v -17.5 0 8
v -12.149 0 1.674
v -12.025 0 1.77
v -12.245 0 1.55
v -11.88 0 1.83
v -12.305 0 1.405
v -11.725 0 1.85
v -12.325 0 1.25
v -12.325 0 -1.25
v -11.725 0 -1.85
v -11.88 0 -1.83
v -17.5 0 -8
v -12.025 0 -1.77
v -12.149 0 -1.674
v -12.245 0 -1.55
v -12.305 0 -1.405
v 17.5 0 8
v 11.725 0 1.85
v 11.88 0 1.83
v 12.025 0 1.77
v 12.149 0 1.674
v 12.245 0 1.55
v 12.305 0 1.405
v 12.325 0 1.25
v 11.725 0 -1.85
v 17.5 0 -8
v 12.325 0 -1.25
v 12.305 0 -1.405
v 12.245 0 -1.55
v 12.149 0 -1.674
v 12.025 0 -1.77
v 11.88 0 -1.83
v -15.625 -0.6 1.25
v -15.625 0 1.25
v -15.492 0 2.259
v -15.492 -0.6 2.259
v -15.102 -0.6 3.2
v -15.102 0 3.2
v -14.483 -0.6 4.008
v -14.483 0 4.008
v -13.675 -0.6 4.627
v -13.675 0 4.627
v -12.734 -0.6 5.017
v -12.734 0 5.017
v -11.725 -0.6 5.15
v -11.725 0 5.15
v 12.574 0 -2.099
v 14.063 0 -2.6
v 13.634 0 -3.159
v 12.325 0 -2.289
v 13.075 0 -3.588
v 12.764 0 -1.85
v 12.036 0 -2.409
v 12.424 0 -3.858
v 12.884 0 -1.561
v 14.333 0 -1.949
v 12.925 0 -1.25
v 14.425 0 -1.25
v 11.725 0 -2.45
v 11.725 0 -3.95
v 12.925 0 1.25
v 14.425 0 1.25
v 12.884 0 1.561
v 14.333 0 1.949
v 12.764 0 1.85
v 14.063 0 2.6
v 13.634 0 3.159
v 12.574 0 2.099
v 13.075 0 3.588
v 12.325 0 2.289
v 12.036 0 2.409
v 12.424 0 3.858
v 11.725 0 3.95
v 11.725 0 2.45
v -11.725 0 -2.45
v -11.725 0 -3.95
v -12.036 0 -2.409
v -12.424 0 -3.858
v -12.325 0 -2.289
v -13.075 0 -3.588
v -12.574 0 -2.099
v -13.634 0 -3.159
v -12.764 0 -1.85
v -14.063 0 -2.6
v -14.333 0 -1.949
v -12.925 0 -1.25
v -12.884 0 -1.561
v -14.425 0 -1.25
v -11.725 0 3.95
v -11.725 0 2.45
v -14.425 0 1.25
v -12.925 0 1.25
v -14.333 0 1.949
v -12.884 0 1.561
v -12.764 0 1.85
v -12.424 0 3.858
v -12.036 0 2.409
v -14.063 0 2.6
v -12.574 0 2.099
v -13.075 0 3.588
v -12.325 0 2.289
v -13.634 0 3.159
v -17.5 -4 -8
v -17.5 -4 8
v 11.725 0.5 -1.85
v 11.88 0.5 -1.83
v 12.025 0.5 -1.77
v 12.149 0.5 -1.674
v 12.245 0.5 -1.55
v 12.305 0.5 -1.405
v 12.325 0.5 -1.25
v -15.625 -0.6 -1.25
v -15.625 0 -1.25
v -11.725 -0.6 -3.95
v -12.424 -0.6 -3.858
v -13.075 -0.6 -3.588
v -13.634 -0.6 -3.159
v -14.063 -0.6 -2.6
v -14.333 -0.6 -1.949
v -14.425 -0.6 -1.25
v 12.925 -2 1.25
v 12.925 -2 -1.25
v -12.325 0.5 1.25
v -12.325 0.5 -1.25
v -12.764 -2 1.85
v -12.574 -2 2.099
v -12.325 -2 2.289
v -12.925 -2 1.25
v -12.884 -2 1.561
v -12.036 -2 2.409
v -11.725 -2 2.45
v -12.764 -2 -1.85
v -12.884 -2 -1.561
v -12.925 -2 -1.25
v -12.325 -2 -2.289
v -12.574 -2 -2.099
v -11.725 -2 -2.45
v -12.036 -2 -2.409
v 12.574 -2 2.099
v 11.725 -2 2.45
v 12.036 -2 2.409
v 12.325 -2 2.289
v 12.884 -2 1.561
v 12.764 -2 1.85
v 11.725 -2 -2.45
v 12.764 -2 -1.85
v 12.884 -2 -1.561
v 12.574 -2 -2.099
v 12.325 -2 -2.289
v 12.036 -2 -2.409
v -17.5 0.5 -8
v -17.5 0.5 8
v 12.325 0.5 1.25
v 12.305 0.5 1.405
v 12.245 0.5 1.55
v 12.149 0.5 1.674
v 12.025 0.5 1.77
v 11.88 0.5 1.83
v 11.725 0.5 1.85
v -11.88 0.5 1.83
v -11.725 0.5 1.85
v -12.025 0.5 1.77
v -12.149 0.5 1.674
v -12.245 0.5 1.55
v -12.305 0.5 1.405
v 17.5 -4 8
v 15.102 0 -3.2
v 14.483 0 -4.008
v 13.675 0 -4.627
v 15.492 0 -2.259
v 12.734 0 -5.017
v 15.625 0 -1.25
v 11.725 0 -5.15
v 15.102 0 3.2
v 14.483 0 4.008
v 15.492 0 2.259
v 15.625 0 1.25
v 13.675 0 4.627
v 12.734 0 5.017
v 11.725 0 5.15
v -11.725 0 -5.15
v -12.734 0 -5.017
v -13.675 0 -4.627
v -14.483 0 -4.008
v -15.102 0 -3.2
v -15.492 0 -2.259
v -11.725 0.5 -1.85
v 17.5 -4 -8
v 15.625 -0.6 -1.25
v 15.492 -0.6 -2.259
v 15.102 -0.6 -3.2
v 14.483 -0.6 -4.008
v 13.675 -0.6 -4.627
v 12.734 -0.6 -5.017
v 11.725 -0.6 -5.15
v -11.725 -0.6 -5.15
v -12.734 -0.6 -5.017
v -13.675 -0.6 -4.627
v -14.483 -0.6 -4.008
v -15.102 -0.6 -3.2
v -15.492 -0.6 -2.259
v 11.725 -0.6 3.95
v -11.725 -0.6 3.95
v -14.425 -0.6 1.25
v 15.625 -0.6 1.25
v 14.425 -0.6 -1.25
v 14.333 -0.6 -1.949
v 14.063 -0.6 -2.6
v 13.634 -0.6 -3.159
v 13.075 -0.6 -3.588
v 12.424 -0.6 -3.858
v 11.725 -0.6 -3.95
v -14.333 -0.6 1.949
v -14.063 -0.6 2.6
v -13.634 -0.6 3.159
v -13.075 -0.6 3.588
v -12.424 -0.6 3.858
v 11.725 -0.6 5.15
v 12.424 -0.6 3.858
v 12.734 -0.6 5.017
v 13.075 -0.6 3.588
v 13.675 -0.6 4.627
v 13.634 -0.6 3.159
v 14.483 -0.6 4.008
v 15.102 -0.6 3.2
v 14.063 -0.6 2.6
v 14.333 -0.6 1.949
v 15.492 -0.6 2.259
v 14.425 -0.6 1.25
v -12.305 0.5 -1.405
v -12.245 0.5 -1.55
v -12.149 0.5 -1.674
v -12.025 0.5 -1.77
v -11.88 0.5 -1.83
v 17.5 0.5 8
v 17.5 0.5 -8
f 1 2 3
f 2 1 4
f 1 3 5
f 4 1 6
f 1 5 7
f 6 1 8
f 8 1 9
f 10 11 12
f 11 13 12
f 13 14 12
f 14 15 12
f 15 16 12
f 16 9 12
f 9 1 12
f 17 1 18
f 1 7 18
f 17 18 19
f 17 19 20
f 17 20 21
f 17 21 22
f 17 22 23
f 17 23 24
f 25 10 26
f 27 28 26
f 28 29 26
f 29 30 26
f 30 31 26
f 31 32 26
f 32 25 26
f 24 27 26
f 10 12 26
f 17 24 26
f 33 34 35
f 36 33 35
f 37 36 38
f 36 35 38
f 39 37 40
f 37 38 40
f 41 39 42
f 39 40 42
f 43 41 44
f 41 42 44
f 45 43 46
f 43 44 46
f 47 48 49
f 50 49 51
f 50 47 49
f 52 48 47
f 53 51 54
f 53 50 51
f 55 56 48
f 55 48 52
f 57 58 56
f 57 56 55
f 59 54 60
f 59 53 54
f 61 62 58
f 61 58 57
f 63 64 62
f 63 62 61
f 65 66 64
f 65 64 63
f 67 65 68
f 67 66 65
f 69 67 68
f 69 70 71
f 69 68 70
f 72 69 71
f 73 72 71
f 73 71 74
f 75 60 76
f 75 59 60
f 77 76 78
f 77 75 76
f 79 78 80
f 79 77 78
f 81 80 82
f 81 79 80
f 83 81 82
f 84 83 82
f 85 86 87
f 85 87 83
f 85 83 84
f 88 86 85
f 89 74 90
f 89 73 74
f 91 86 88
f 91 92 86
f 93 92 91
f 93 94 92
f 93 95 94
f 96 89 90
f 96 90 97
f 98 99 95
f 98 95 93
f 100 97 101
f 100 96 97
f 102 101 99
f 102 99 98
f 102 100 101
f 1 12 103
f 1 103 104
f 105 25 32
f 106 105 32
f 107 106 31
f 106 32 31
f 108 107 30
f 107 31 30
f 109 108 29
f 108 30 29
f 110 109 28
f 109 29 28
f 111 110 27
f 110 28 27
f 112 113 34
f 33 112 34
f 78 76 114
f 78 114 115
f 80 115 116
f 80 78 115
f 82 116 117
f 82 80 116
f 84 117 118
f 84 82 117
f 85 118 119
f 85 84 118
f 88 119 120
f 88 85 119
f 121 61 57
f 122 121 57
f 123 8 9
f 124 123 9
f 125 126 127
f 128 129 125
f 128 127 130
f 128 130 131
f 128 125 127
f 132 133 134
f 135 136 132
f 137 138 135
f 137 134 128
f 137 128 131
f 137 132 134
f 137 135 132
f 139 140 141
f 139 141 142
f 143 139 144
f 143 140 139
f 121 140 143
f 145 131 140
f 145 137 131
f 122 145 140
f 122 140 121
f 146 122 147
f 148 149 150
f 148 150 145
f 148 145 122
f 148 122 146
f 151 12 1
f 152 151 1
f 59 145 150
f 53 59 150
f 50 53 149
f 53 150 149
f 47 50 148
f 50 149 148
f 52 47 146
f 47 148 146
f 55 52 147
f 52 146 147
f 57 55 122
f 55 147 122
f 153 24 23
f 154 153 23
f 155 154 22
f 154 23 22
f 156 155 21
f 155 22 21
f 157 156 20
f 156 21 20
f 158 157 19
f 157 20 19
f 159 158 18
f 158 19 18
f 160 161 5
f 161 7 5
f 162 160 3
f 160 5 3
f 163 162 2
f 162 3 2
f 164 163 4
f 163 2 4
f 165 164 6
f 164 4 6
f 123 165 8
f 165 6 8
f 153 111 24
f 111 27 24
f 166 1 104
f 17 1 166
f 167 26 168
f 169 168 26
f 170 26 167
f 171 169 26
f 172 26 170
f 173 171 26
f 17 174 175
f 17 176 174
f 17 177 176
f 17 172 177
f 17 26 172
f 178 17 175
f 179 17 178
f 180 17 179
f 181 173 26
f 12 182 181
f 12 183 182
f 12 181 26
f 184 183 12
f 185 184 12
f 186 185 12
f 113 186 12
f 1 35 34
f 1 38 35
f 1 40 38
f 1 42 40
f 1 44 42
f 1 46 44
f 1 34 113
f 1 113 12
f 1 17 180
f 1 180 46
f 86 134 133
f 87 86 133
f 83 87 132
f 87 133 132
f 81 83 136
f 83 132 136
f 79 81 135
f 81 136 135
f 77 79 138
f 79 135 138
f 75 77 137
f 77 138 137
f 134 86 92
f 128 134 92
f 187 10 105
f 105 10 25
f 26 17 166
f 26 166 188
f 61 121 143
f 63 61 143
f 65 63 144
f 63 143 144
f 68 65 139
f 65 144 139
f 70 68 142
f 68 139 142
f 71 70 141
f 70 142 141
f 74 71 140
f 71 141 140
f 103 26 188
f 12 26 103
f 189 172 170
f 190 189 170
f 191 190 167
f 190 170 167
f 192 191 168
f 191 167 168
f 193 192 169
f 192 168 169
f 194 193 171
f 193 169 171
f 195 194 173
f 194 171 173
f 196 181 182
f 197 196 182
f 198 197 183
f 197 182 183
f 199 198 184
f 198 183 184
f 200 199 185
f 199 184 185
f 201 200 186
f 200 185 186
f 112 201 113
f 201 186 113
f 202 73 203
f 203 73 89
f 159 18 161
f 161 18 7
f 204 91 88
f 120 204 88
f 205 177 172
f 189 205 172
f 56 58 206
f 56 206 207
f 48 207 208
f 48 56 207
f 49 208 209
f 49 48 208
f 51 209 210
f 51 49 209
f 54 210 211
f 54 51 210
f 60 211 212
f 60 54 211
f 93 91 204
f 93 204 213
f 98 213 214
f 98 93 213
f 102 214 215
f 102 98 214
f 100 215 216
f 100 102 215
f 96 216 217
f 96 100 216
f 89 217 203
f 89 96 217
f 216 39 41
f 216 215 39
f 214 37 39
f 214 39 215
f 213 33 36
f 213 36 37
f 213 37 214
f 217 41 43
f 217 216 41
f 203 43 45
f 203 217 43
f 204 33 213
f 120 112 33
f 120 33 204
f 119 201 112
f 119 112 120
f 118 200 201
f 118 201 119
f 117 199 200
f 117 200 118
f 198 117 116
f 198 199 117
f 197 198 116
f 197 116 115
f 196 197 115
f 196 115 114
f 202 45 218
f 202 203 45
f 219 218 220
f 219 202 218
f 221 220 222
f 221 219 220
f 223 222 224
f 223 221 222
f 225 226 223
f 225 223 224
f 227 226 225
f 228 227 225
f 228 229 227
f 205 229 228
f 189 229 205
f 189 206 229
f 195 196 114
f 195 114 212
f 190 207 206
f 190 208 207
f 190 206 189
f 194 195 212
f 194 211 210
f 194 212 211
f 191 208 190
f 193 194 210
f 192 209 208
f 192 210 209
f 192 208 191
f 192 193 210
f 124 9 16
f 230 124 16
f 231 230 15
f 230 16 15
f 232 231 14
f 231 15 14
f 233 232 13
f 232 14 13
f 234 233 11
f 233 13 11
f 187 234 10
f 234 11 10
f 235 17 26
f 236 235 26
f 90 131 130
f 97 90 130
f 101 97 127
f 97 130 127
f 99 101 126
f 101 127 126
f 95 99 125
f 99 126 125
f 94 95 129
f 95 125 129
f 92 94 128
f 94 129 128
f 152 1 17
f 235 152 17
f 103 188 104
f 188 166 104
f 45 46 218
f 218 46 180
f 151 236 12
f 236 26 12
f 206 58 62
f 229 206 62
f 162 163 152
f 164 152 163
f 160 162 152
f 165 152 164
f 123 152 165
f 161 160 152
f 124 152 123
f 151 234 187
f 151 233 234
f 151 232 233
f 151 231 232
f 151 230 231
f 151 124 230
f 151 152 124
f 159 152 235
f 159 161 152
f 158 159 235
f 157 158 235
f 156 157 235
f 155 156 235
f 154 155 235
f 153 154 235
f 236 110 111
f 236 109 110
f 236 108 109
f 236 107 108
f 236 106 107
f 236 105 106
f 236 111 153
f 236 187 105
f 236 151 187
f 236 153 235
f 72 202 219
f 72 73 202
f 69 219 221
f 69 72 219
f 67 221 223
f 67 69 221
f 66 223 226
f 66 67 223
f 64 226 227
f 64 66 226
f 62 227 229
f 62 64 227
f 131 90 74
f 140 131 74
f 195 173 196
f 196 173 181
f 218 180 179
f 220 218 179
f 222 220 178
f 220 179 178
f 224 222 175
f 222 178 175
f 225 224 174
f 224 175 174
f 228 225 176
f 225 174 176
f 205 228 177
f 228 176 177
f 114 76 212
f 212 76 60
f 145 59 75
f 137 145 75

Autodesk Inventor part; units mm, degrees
ref_plane "XZ Plane" through (0, 0, 0) normal (0, 1, 0) x (-1, 0, 0)
sketch "Sketch1" plane through (0, 0, 0) normal (0, 1, 0) x (-1, 0, 0)
  line L0 (13.925, -3.65) -> (-13.925, -3.65)
  line L1 (-13.925, -3.65) -> (-13.925, 3.65)
  line L2 (-13.925, 3.65) -> (13.925, 3.65)
  line L3 (13.925, 3.65) -> (13.925, -3.65)
  line L4 (13.925, -3.65) -> (-13.925, 3.65) construction
  line L5 (-13.925, -3.65) -> (13.925, 3.65) construction
  line L6 (11.725, -1.25) -> (-11.725, -1.25)
  line L7 (-11.725, -1.25) -> (-11.725, 1.25)
  line L8 (-11.725, 1.25) -> (11.725, 1.25)
  line L9 (11.725, 1.25) -> (11.725, -1.25)
  line L10 (11.725, -1.25) -> (-11.725, 1.25) construction
  line L11 (-11.725, -1.25) -> (11.725, 1.25) construction
  line L12 (11.725, -1.25) -> (11.725, -3.65) construction
  line L13 (11.725, 1.25) -> (11.725, 3.65) construction
  line L14 (11.725, -1.25) -> (13.925, -1.25) construction
  line L15 (-11.725, -1.25) -> (-13.925, -1.25) construction
  line L16 (11.725, 0) -> (-11.725, 0) construction
  point P0 (0, 0)
  point P1 (0, 0)
  point P2 (0, 0)
  point P3 (0, 0)
  dimension "d0" = 27.85
  dimension "d1" = 7.3
  dimension "d2" = 2.4
  dimension "d3" = 2.4
  dimension "d4" = 2.5
  dimension "d5" = 2.2
  dimension "d6" = 23.45
sketch "Sketch2" plane through (0, 0, 0) normal (0, 1, 0) x (-1, 0, 0)
  line L0 (17.5, 8) -> (-17.5, 8)
  line L1 (-17.5, 8) -> (-17.5, -8)
  line L2 (-17.5, -8) -> (17.5, -8)
  line L3 (17.5, -8) -> (17.5, 8)
  line L4 (17.5, 8) -> (-17.5, -8) construction
  point P0 (0, 0)
  point P1 (0, 0)
  dimension "d7" = 35
  dimension "d8" = 16
extrude "Extrusion1" add sketch "Sketch2" against normal blind 4
sketch "Sketch5" plane through (0, 0, 0) normal (0, 1, 0) x (1, 0, 0)
  line L0 (-12.925, -2.45) -> (12.925, -2.45)
  line L1 (12.925, -2.45) -> (12.925, 2.45)
  line L2 (12.925, 2.45) -> (-12.925, 2.45)
  line L3 (-12.925, 2.45) -> (-12.925, -2.45)
  line L4 (-12.925, -2.45) -> (12.925, 2.45) construction
  line L5 (11.725, -1.25) -> (-11.725, -1.25) construction
  line L6 (-11.725, 1.25) -> (11.725, 1.25) construction
  line L7 (41.3, 0) -> (-41.3, 0) construction
  line L8 (0, 14) -> (0, -14) construction
  point P0 (0, 0)
  point P1 (0, 0)
  dimension "d11" = 1.2
  dimension "d12" = 1.2
extrude "Extrusion2" cut sketch "Sketch5" against normal blind 2
fillet "Fillet1" radius 1.2 4 edges at (12.925, -1, 2.45) (-12.925, -1, 2.45) (-12.925, -1, -2.45) (12.925, -1, -2.45)
sketch "Sketch6" plane through (0, 0, 0) normal (0, 1, 0) x (1, 0, 0)
  arc A0 (12.925, 1.25) -> (11.725, 2.45) centre (11.725, 1.25) ccw projected
  line L0 (-11.725, 2.45) -> (11.725, 2.45) projected
  arc A1 (-11.725, 2.45) -> (-12.925, 1.25) centre (-11.725, 1.25) ccw projected
  line L1 (-12.925, -1.25) -> (-12.925, 1.25) projected
  arc A2 (-12.925, -1.25) -> (-11.725, -2.45) centre (-11.725, -1.25) ccw projected
  line L2 (11.725, -2.45) -> (-11.725, -2.45) projected
  arc A3 (11.725, -2.45) -> (12.925, -1.25) centre (11.725, -1.25) ccw projected
  line L3 (12.925, 1.25) -> (12.925, -1.25) projected
  arc A4 (14.425, 1.25) -> (11.725, 3.95) centre (11.725, 1.25) ccw
  line L4 (14.425, 1.25) -> (14.425, -1.25)
  arc A5 (11.725, -3.95) -> (14.425, -1.25) centre (11.725, -1.25) ccw
  line L5 (11.725, -3.95) -> (-11.725, -3.95)
  arc A6 (-14.425, -1.25) -> (-11.725, -3.95) centre (-11.725, -1.25) ccw
  line L6 (-14.425, -1.25) -> (-14.425, 1.25)
  arc A7 (-11.725, 3.95) -> (-14.425, 1.25) centre (-11.725, 1.25) ccw
  line L7 (-11.725, 3.95) -> (11.725, 3.95)
  line L8 (-15.625, 1.25) -> (-15.625, -1.25)
  arc A8 (-15.625, -1.25) -> (-11.725, -5.15) centre (-11.725, -1.25) ccw
  line L9 (-11.725, -5.15) -> (11.725, -5.15)
  arc A9 (11.725, -5.15) -> (15.625, -1.25) centre (11.725, -1.25) ccw
  line L10 (15.625, -1.25) -> (15.625, 1.25)
  arc A10 (15.625, 1.25) -> (11.725, 5.15) centre (11.725, 1.25) ccw
  line L11 (11.725, 5.15) -> (-11.725, 5.15)
  arc A11 (-11.725, 5.15) -> (-15.625, 1.25) centre (-11.725, 1.25) ccw
  point P0 (0, 0)
  dimension "d16" = 1.5
  dimension "d17" = 1.2
extrude "Extrusion3" cut sketch "Sketch6" against normal blind 0.6 contours A11 L11 A10 L10 A9 L9 A8 L8
sketch "Sketch7" plane through (0, 0, 0) normal (0, 1, 0) x (1, 0, 0)
  line L0 (-29.5, -10) -> (29.5, -10)
  line L1 (29.5, -10) -> (29.5, 10)
  line L2 (29.5, 10) -> (-29.5, 10)
  line L3 (-29.5, 10) -> (-29.5, -10)
  line L4 (-41.3, 0) -> (41.3, 0) construction
  line L5 (0, 14) -> (0, -14) construction
  line L6 (-17.5, 8) -> (-17.5, -8) construction
  line L7 (17.5, 8) -> (-17.5, 8) construction
  point P0 (0, 0)
  dimension "d20" = 12
  dimension "d21" = 2
sketch "Sketch9" plane through (0, 0, 0) normal (0, 1, 0) x (1, 0, 0)
  arc A0 (12.925, 1.25) -> (11.725, 2.45) centre (11.725, 1.25) ccw construction
  line L0 (-11.725, 2.45) -> (11.725, 2.45) construction
  arc A1 (-11.725, 2.45) -> (-12.925, 1.25) centre (-11.725, 1.25) ccw construction
  line L1 (-12.925, -1.25) -> (-12.925, 1.25) construction
  arc A2 (-12.925, -1.25) -> (-11.725, -2.45) centre (-11.725, -1.25) ccw construction
  line L2 (11.725, -2.45) -> (-11.725, -2.45) construction
  arc A3 (11.725, -2.45) -> (12.925, -1.25) centre (11.725, -1.25) ccw construction
  line L3 (12.925, 1.25) -> (12.925, -1.25) construction
  arc A4 (-12.325, -1.25) -> (-11.725, -1.85) centre (-11.725, -1.25) ccw
  line L4 (-12.325, -1.25) -> (-12.325, 1.25)
  arc A5 (-11.725, 1.85) -> (-12.325, 1.25) centre (-11.725, 1.25) ccw
  line L5 (-11.725, 1.85) -> (11.725, 1.85)
  arc A6 (12.325, 1.25) -> (11.725, 1.85) centre (11.725, 1.25) ccw
  line L6 (12.325, 1.25) -> (12.325, -1.25)
  arc A7 (11.725, -1.85) -> (12.325, -1.25) centre (11.725, -1.25) ccw
  line L7 (11.725, -1.85) -> (-11.725, -1.85)
  line L8 (-17.5, 8) -> (-17.5, -8) projected
  line L9 (-17.5, -8) -> (17.5, -8) projected
  line L10 (17.5, 8) -> (-17.5, 8) projected
  line L11 (17.5, -8) -> (17.5, 8) projected
  point P0 (0, 0)
  dimension "d51" = 0.6
extrude "Extrusion10" add sketch "Sketch9" along normal blind 0.5 separate body
ref_plane "TopLayer" through (0, 0, 0) normal (0, 1, 0) x (1, 0, 0)
ref_plane "BottomLayer" through (0, -4, 0) normal (0, -1, 0) x (1, 0, 0)
equation "\"d12\" = d11"
properties part number "Capping_Insert"
